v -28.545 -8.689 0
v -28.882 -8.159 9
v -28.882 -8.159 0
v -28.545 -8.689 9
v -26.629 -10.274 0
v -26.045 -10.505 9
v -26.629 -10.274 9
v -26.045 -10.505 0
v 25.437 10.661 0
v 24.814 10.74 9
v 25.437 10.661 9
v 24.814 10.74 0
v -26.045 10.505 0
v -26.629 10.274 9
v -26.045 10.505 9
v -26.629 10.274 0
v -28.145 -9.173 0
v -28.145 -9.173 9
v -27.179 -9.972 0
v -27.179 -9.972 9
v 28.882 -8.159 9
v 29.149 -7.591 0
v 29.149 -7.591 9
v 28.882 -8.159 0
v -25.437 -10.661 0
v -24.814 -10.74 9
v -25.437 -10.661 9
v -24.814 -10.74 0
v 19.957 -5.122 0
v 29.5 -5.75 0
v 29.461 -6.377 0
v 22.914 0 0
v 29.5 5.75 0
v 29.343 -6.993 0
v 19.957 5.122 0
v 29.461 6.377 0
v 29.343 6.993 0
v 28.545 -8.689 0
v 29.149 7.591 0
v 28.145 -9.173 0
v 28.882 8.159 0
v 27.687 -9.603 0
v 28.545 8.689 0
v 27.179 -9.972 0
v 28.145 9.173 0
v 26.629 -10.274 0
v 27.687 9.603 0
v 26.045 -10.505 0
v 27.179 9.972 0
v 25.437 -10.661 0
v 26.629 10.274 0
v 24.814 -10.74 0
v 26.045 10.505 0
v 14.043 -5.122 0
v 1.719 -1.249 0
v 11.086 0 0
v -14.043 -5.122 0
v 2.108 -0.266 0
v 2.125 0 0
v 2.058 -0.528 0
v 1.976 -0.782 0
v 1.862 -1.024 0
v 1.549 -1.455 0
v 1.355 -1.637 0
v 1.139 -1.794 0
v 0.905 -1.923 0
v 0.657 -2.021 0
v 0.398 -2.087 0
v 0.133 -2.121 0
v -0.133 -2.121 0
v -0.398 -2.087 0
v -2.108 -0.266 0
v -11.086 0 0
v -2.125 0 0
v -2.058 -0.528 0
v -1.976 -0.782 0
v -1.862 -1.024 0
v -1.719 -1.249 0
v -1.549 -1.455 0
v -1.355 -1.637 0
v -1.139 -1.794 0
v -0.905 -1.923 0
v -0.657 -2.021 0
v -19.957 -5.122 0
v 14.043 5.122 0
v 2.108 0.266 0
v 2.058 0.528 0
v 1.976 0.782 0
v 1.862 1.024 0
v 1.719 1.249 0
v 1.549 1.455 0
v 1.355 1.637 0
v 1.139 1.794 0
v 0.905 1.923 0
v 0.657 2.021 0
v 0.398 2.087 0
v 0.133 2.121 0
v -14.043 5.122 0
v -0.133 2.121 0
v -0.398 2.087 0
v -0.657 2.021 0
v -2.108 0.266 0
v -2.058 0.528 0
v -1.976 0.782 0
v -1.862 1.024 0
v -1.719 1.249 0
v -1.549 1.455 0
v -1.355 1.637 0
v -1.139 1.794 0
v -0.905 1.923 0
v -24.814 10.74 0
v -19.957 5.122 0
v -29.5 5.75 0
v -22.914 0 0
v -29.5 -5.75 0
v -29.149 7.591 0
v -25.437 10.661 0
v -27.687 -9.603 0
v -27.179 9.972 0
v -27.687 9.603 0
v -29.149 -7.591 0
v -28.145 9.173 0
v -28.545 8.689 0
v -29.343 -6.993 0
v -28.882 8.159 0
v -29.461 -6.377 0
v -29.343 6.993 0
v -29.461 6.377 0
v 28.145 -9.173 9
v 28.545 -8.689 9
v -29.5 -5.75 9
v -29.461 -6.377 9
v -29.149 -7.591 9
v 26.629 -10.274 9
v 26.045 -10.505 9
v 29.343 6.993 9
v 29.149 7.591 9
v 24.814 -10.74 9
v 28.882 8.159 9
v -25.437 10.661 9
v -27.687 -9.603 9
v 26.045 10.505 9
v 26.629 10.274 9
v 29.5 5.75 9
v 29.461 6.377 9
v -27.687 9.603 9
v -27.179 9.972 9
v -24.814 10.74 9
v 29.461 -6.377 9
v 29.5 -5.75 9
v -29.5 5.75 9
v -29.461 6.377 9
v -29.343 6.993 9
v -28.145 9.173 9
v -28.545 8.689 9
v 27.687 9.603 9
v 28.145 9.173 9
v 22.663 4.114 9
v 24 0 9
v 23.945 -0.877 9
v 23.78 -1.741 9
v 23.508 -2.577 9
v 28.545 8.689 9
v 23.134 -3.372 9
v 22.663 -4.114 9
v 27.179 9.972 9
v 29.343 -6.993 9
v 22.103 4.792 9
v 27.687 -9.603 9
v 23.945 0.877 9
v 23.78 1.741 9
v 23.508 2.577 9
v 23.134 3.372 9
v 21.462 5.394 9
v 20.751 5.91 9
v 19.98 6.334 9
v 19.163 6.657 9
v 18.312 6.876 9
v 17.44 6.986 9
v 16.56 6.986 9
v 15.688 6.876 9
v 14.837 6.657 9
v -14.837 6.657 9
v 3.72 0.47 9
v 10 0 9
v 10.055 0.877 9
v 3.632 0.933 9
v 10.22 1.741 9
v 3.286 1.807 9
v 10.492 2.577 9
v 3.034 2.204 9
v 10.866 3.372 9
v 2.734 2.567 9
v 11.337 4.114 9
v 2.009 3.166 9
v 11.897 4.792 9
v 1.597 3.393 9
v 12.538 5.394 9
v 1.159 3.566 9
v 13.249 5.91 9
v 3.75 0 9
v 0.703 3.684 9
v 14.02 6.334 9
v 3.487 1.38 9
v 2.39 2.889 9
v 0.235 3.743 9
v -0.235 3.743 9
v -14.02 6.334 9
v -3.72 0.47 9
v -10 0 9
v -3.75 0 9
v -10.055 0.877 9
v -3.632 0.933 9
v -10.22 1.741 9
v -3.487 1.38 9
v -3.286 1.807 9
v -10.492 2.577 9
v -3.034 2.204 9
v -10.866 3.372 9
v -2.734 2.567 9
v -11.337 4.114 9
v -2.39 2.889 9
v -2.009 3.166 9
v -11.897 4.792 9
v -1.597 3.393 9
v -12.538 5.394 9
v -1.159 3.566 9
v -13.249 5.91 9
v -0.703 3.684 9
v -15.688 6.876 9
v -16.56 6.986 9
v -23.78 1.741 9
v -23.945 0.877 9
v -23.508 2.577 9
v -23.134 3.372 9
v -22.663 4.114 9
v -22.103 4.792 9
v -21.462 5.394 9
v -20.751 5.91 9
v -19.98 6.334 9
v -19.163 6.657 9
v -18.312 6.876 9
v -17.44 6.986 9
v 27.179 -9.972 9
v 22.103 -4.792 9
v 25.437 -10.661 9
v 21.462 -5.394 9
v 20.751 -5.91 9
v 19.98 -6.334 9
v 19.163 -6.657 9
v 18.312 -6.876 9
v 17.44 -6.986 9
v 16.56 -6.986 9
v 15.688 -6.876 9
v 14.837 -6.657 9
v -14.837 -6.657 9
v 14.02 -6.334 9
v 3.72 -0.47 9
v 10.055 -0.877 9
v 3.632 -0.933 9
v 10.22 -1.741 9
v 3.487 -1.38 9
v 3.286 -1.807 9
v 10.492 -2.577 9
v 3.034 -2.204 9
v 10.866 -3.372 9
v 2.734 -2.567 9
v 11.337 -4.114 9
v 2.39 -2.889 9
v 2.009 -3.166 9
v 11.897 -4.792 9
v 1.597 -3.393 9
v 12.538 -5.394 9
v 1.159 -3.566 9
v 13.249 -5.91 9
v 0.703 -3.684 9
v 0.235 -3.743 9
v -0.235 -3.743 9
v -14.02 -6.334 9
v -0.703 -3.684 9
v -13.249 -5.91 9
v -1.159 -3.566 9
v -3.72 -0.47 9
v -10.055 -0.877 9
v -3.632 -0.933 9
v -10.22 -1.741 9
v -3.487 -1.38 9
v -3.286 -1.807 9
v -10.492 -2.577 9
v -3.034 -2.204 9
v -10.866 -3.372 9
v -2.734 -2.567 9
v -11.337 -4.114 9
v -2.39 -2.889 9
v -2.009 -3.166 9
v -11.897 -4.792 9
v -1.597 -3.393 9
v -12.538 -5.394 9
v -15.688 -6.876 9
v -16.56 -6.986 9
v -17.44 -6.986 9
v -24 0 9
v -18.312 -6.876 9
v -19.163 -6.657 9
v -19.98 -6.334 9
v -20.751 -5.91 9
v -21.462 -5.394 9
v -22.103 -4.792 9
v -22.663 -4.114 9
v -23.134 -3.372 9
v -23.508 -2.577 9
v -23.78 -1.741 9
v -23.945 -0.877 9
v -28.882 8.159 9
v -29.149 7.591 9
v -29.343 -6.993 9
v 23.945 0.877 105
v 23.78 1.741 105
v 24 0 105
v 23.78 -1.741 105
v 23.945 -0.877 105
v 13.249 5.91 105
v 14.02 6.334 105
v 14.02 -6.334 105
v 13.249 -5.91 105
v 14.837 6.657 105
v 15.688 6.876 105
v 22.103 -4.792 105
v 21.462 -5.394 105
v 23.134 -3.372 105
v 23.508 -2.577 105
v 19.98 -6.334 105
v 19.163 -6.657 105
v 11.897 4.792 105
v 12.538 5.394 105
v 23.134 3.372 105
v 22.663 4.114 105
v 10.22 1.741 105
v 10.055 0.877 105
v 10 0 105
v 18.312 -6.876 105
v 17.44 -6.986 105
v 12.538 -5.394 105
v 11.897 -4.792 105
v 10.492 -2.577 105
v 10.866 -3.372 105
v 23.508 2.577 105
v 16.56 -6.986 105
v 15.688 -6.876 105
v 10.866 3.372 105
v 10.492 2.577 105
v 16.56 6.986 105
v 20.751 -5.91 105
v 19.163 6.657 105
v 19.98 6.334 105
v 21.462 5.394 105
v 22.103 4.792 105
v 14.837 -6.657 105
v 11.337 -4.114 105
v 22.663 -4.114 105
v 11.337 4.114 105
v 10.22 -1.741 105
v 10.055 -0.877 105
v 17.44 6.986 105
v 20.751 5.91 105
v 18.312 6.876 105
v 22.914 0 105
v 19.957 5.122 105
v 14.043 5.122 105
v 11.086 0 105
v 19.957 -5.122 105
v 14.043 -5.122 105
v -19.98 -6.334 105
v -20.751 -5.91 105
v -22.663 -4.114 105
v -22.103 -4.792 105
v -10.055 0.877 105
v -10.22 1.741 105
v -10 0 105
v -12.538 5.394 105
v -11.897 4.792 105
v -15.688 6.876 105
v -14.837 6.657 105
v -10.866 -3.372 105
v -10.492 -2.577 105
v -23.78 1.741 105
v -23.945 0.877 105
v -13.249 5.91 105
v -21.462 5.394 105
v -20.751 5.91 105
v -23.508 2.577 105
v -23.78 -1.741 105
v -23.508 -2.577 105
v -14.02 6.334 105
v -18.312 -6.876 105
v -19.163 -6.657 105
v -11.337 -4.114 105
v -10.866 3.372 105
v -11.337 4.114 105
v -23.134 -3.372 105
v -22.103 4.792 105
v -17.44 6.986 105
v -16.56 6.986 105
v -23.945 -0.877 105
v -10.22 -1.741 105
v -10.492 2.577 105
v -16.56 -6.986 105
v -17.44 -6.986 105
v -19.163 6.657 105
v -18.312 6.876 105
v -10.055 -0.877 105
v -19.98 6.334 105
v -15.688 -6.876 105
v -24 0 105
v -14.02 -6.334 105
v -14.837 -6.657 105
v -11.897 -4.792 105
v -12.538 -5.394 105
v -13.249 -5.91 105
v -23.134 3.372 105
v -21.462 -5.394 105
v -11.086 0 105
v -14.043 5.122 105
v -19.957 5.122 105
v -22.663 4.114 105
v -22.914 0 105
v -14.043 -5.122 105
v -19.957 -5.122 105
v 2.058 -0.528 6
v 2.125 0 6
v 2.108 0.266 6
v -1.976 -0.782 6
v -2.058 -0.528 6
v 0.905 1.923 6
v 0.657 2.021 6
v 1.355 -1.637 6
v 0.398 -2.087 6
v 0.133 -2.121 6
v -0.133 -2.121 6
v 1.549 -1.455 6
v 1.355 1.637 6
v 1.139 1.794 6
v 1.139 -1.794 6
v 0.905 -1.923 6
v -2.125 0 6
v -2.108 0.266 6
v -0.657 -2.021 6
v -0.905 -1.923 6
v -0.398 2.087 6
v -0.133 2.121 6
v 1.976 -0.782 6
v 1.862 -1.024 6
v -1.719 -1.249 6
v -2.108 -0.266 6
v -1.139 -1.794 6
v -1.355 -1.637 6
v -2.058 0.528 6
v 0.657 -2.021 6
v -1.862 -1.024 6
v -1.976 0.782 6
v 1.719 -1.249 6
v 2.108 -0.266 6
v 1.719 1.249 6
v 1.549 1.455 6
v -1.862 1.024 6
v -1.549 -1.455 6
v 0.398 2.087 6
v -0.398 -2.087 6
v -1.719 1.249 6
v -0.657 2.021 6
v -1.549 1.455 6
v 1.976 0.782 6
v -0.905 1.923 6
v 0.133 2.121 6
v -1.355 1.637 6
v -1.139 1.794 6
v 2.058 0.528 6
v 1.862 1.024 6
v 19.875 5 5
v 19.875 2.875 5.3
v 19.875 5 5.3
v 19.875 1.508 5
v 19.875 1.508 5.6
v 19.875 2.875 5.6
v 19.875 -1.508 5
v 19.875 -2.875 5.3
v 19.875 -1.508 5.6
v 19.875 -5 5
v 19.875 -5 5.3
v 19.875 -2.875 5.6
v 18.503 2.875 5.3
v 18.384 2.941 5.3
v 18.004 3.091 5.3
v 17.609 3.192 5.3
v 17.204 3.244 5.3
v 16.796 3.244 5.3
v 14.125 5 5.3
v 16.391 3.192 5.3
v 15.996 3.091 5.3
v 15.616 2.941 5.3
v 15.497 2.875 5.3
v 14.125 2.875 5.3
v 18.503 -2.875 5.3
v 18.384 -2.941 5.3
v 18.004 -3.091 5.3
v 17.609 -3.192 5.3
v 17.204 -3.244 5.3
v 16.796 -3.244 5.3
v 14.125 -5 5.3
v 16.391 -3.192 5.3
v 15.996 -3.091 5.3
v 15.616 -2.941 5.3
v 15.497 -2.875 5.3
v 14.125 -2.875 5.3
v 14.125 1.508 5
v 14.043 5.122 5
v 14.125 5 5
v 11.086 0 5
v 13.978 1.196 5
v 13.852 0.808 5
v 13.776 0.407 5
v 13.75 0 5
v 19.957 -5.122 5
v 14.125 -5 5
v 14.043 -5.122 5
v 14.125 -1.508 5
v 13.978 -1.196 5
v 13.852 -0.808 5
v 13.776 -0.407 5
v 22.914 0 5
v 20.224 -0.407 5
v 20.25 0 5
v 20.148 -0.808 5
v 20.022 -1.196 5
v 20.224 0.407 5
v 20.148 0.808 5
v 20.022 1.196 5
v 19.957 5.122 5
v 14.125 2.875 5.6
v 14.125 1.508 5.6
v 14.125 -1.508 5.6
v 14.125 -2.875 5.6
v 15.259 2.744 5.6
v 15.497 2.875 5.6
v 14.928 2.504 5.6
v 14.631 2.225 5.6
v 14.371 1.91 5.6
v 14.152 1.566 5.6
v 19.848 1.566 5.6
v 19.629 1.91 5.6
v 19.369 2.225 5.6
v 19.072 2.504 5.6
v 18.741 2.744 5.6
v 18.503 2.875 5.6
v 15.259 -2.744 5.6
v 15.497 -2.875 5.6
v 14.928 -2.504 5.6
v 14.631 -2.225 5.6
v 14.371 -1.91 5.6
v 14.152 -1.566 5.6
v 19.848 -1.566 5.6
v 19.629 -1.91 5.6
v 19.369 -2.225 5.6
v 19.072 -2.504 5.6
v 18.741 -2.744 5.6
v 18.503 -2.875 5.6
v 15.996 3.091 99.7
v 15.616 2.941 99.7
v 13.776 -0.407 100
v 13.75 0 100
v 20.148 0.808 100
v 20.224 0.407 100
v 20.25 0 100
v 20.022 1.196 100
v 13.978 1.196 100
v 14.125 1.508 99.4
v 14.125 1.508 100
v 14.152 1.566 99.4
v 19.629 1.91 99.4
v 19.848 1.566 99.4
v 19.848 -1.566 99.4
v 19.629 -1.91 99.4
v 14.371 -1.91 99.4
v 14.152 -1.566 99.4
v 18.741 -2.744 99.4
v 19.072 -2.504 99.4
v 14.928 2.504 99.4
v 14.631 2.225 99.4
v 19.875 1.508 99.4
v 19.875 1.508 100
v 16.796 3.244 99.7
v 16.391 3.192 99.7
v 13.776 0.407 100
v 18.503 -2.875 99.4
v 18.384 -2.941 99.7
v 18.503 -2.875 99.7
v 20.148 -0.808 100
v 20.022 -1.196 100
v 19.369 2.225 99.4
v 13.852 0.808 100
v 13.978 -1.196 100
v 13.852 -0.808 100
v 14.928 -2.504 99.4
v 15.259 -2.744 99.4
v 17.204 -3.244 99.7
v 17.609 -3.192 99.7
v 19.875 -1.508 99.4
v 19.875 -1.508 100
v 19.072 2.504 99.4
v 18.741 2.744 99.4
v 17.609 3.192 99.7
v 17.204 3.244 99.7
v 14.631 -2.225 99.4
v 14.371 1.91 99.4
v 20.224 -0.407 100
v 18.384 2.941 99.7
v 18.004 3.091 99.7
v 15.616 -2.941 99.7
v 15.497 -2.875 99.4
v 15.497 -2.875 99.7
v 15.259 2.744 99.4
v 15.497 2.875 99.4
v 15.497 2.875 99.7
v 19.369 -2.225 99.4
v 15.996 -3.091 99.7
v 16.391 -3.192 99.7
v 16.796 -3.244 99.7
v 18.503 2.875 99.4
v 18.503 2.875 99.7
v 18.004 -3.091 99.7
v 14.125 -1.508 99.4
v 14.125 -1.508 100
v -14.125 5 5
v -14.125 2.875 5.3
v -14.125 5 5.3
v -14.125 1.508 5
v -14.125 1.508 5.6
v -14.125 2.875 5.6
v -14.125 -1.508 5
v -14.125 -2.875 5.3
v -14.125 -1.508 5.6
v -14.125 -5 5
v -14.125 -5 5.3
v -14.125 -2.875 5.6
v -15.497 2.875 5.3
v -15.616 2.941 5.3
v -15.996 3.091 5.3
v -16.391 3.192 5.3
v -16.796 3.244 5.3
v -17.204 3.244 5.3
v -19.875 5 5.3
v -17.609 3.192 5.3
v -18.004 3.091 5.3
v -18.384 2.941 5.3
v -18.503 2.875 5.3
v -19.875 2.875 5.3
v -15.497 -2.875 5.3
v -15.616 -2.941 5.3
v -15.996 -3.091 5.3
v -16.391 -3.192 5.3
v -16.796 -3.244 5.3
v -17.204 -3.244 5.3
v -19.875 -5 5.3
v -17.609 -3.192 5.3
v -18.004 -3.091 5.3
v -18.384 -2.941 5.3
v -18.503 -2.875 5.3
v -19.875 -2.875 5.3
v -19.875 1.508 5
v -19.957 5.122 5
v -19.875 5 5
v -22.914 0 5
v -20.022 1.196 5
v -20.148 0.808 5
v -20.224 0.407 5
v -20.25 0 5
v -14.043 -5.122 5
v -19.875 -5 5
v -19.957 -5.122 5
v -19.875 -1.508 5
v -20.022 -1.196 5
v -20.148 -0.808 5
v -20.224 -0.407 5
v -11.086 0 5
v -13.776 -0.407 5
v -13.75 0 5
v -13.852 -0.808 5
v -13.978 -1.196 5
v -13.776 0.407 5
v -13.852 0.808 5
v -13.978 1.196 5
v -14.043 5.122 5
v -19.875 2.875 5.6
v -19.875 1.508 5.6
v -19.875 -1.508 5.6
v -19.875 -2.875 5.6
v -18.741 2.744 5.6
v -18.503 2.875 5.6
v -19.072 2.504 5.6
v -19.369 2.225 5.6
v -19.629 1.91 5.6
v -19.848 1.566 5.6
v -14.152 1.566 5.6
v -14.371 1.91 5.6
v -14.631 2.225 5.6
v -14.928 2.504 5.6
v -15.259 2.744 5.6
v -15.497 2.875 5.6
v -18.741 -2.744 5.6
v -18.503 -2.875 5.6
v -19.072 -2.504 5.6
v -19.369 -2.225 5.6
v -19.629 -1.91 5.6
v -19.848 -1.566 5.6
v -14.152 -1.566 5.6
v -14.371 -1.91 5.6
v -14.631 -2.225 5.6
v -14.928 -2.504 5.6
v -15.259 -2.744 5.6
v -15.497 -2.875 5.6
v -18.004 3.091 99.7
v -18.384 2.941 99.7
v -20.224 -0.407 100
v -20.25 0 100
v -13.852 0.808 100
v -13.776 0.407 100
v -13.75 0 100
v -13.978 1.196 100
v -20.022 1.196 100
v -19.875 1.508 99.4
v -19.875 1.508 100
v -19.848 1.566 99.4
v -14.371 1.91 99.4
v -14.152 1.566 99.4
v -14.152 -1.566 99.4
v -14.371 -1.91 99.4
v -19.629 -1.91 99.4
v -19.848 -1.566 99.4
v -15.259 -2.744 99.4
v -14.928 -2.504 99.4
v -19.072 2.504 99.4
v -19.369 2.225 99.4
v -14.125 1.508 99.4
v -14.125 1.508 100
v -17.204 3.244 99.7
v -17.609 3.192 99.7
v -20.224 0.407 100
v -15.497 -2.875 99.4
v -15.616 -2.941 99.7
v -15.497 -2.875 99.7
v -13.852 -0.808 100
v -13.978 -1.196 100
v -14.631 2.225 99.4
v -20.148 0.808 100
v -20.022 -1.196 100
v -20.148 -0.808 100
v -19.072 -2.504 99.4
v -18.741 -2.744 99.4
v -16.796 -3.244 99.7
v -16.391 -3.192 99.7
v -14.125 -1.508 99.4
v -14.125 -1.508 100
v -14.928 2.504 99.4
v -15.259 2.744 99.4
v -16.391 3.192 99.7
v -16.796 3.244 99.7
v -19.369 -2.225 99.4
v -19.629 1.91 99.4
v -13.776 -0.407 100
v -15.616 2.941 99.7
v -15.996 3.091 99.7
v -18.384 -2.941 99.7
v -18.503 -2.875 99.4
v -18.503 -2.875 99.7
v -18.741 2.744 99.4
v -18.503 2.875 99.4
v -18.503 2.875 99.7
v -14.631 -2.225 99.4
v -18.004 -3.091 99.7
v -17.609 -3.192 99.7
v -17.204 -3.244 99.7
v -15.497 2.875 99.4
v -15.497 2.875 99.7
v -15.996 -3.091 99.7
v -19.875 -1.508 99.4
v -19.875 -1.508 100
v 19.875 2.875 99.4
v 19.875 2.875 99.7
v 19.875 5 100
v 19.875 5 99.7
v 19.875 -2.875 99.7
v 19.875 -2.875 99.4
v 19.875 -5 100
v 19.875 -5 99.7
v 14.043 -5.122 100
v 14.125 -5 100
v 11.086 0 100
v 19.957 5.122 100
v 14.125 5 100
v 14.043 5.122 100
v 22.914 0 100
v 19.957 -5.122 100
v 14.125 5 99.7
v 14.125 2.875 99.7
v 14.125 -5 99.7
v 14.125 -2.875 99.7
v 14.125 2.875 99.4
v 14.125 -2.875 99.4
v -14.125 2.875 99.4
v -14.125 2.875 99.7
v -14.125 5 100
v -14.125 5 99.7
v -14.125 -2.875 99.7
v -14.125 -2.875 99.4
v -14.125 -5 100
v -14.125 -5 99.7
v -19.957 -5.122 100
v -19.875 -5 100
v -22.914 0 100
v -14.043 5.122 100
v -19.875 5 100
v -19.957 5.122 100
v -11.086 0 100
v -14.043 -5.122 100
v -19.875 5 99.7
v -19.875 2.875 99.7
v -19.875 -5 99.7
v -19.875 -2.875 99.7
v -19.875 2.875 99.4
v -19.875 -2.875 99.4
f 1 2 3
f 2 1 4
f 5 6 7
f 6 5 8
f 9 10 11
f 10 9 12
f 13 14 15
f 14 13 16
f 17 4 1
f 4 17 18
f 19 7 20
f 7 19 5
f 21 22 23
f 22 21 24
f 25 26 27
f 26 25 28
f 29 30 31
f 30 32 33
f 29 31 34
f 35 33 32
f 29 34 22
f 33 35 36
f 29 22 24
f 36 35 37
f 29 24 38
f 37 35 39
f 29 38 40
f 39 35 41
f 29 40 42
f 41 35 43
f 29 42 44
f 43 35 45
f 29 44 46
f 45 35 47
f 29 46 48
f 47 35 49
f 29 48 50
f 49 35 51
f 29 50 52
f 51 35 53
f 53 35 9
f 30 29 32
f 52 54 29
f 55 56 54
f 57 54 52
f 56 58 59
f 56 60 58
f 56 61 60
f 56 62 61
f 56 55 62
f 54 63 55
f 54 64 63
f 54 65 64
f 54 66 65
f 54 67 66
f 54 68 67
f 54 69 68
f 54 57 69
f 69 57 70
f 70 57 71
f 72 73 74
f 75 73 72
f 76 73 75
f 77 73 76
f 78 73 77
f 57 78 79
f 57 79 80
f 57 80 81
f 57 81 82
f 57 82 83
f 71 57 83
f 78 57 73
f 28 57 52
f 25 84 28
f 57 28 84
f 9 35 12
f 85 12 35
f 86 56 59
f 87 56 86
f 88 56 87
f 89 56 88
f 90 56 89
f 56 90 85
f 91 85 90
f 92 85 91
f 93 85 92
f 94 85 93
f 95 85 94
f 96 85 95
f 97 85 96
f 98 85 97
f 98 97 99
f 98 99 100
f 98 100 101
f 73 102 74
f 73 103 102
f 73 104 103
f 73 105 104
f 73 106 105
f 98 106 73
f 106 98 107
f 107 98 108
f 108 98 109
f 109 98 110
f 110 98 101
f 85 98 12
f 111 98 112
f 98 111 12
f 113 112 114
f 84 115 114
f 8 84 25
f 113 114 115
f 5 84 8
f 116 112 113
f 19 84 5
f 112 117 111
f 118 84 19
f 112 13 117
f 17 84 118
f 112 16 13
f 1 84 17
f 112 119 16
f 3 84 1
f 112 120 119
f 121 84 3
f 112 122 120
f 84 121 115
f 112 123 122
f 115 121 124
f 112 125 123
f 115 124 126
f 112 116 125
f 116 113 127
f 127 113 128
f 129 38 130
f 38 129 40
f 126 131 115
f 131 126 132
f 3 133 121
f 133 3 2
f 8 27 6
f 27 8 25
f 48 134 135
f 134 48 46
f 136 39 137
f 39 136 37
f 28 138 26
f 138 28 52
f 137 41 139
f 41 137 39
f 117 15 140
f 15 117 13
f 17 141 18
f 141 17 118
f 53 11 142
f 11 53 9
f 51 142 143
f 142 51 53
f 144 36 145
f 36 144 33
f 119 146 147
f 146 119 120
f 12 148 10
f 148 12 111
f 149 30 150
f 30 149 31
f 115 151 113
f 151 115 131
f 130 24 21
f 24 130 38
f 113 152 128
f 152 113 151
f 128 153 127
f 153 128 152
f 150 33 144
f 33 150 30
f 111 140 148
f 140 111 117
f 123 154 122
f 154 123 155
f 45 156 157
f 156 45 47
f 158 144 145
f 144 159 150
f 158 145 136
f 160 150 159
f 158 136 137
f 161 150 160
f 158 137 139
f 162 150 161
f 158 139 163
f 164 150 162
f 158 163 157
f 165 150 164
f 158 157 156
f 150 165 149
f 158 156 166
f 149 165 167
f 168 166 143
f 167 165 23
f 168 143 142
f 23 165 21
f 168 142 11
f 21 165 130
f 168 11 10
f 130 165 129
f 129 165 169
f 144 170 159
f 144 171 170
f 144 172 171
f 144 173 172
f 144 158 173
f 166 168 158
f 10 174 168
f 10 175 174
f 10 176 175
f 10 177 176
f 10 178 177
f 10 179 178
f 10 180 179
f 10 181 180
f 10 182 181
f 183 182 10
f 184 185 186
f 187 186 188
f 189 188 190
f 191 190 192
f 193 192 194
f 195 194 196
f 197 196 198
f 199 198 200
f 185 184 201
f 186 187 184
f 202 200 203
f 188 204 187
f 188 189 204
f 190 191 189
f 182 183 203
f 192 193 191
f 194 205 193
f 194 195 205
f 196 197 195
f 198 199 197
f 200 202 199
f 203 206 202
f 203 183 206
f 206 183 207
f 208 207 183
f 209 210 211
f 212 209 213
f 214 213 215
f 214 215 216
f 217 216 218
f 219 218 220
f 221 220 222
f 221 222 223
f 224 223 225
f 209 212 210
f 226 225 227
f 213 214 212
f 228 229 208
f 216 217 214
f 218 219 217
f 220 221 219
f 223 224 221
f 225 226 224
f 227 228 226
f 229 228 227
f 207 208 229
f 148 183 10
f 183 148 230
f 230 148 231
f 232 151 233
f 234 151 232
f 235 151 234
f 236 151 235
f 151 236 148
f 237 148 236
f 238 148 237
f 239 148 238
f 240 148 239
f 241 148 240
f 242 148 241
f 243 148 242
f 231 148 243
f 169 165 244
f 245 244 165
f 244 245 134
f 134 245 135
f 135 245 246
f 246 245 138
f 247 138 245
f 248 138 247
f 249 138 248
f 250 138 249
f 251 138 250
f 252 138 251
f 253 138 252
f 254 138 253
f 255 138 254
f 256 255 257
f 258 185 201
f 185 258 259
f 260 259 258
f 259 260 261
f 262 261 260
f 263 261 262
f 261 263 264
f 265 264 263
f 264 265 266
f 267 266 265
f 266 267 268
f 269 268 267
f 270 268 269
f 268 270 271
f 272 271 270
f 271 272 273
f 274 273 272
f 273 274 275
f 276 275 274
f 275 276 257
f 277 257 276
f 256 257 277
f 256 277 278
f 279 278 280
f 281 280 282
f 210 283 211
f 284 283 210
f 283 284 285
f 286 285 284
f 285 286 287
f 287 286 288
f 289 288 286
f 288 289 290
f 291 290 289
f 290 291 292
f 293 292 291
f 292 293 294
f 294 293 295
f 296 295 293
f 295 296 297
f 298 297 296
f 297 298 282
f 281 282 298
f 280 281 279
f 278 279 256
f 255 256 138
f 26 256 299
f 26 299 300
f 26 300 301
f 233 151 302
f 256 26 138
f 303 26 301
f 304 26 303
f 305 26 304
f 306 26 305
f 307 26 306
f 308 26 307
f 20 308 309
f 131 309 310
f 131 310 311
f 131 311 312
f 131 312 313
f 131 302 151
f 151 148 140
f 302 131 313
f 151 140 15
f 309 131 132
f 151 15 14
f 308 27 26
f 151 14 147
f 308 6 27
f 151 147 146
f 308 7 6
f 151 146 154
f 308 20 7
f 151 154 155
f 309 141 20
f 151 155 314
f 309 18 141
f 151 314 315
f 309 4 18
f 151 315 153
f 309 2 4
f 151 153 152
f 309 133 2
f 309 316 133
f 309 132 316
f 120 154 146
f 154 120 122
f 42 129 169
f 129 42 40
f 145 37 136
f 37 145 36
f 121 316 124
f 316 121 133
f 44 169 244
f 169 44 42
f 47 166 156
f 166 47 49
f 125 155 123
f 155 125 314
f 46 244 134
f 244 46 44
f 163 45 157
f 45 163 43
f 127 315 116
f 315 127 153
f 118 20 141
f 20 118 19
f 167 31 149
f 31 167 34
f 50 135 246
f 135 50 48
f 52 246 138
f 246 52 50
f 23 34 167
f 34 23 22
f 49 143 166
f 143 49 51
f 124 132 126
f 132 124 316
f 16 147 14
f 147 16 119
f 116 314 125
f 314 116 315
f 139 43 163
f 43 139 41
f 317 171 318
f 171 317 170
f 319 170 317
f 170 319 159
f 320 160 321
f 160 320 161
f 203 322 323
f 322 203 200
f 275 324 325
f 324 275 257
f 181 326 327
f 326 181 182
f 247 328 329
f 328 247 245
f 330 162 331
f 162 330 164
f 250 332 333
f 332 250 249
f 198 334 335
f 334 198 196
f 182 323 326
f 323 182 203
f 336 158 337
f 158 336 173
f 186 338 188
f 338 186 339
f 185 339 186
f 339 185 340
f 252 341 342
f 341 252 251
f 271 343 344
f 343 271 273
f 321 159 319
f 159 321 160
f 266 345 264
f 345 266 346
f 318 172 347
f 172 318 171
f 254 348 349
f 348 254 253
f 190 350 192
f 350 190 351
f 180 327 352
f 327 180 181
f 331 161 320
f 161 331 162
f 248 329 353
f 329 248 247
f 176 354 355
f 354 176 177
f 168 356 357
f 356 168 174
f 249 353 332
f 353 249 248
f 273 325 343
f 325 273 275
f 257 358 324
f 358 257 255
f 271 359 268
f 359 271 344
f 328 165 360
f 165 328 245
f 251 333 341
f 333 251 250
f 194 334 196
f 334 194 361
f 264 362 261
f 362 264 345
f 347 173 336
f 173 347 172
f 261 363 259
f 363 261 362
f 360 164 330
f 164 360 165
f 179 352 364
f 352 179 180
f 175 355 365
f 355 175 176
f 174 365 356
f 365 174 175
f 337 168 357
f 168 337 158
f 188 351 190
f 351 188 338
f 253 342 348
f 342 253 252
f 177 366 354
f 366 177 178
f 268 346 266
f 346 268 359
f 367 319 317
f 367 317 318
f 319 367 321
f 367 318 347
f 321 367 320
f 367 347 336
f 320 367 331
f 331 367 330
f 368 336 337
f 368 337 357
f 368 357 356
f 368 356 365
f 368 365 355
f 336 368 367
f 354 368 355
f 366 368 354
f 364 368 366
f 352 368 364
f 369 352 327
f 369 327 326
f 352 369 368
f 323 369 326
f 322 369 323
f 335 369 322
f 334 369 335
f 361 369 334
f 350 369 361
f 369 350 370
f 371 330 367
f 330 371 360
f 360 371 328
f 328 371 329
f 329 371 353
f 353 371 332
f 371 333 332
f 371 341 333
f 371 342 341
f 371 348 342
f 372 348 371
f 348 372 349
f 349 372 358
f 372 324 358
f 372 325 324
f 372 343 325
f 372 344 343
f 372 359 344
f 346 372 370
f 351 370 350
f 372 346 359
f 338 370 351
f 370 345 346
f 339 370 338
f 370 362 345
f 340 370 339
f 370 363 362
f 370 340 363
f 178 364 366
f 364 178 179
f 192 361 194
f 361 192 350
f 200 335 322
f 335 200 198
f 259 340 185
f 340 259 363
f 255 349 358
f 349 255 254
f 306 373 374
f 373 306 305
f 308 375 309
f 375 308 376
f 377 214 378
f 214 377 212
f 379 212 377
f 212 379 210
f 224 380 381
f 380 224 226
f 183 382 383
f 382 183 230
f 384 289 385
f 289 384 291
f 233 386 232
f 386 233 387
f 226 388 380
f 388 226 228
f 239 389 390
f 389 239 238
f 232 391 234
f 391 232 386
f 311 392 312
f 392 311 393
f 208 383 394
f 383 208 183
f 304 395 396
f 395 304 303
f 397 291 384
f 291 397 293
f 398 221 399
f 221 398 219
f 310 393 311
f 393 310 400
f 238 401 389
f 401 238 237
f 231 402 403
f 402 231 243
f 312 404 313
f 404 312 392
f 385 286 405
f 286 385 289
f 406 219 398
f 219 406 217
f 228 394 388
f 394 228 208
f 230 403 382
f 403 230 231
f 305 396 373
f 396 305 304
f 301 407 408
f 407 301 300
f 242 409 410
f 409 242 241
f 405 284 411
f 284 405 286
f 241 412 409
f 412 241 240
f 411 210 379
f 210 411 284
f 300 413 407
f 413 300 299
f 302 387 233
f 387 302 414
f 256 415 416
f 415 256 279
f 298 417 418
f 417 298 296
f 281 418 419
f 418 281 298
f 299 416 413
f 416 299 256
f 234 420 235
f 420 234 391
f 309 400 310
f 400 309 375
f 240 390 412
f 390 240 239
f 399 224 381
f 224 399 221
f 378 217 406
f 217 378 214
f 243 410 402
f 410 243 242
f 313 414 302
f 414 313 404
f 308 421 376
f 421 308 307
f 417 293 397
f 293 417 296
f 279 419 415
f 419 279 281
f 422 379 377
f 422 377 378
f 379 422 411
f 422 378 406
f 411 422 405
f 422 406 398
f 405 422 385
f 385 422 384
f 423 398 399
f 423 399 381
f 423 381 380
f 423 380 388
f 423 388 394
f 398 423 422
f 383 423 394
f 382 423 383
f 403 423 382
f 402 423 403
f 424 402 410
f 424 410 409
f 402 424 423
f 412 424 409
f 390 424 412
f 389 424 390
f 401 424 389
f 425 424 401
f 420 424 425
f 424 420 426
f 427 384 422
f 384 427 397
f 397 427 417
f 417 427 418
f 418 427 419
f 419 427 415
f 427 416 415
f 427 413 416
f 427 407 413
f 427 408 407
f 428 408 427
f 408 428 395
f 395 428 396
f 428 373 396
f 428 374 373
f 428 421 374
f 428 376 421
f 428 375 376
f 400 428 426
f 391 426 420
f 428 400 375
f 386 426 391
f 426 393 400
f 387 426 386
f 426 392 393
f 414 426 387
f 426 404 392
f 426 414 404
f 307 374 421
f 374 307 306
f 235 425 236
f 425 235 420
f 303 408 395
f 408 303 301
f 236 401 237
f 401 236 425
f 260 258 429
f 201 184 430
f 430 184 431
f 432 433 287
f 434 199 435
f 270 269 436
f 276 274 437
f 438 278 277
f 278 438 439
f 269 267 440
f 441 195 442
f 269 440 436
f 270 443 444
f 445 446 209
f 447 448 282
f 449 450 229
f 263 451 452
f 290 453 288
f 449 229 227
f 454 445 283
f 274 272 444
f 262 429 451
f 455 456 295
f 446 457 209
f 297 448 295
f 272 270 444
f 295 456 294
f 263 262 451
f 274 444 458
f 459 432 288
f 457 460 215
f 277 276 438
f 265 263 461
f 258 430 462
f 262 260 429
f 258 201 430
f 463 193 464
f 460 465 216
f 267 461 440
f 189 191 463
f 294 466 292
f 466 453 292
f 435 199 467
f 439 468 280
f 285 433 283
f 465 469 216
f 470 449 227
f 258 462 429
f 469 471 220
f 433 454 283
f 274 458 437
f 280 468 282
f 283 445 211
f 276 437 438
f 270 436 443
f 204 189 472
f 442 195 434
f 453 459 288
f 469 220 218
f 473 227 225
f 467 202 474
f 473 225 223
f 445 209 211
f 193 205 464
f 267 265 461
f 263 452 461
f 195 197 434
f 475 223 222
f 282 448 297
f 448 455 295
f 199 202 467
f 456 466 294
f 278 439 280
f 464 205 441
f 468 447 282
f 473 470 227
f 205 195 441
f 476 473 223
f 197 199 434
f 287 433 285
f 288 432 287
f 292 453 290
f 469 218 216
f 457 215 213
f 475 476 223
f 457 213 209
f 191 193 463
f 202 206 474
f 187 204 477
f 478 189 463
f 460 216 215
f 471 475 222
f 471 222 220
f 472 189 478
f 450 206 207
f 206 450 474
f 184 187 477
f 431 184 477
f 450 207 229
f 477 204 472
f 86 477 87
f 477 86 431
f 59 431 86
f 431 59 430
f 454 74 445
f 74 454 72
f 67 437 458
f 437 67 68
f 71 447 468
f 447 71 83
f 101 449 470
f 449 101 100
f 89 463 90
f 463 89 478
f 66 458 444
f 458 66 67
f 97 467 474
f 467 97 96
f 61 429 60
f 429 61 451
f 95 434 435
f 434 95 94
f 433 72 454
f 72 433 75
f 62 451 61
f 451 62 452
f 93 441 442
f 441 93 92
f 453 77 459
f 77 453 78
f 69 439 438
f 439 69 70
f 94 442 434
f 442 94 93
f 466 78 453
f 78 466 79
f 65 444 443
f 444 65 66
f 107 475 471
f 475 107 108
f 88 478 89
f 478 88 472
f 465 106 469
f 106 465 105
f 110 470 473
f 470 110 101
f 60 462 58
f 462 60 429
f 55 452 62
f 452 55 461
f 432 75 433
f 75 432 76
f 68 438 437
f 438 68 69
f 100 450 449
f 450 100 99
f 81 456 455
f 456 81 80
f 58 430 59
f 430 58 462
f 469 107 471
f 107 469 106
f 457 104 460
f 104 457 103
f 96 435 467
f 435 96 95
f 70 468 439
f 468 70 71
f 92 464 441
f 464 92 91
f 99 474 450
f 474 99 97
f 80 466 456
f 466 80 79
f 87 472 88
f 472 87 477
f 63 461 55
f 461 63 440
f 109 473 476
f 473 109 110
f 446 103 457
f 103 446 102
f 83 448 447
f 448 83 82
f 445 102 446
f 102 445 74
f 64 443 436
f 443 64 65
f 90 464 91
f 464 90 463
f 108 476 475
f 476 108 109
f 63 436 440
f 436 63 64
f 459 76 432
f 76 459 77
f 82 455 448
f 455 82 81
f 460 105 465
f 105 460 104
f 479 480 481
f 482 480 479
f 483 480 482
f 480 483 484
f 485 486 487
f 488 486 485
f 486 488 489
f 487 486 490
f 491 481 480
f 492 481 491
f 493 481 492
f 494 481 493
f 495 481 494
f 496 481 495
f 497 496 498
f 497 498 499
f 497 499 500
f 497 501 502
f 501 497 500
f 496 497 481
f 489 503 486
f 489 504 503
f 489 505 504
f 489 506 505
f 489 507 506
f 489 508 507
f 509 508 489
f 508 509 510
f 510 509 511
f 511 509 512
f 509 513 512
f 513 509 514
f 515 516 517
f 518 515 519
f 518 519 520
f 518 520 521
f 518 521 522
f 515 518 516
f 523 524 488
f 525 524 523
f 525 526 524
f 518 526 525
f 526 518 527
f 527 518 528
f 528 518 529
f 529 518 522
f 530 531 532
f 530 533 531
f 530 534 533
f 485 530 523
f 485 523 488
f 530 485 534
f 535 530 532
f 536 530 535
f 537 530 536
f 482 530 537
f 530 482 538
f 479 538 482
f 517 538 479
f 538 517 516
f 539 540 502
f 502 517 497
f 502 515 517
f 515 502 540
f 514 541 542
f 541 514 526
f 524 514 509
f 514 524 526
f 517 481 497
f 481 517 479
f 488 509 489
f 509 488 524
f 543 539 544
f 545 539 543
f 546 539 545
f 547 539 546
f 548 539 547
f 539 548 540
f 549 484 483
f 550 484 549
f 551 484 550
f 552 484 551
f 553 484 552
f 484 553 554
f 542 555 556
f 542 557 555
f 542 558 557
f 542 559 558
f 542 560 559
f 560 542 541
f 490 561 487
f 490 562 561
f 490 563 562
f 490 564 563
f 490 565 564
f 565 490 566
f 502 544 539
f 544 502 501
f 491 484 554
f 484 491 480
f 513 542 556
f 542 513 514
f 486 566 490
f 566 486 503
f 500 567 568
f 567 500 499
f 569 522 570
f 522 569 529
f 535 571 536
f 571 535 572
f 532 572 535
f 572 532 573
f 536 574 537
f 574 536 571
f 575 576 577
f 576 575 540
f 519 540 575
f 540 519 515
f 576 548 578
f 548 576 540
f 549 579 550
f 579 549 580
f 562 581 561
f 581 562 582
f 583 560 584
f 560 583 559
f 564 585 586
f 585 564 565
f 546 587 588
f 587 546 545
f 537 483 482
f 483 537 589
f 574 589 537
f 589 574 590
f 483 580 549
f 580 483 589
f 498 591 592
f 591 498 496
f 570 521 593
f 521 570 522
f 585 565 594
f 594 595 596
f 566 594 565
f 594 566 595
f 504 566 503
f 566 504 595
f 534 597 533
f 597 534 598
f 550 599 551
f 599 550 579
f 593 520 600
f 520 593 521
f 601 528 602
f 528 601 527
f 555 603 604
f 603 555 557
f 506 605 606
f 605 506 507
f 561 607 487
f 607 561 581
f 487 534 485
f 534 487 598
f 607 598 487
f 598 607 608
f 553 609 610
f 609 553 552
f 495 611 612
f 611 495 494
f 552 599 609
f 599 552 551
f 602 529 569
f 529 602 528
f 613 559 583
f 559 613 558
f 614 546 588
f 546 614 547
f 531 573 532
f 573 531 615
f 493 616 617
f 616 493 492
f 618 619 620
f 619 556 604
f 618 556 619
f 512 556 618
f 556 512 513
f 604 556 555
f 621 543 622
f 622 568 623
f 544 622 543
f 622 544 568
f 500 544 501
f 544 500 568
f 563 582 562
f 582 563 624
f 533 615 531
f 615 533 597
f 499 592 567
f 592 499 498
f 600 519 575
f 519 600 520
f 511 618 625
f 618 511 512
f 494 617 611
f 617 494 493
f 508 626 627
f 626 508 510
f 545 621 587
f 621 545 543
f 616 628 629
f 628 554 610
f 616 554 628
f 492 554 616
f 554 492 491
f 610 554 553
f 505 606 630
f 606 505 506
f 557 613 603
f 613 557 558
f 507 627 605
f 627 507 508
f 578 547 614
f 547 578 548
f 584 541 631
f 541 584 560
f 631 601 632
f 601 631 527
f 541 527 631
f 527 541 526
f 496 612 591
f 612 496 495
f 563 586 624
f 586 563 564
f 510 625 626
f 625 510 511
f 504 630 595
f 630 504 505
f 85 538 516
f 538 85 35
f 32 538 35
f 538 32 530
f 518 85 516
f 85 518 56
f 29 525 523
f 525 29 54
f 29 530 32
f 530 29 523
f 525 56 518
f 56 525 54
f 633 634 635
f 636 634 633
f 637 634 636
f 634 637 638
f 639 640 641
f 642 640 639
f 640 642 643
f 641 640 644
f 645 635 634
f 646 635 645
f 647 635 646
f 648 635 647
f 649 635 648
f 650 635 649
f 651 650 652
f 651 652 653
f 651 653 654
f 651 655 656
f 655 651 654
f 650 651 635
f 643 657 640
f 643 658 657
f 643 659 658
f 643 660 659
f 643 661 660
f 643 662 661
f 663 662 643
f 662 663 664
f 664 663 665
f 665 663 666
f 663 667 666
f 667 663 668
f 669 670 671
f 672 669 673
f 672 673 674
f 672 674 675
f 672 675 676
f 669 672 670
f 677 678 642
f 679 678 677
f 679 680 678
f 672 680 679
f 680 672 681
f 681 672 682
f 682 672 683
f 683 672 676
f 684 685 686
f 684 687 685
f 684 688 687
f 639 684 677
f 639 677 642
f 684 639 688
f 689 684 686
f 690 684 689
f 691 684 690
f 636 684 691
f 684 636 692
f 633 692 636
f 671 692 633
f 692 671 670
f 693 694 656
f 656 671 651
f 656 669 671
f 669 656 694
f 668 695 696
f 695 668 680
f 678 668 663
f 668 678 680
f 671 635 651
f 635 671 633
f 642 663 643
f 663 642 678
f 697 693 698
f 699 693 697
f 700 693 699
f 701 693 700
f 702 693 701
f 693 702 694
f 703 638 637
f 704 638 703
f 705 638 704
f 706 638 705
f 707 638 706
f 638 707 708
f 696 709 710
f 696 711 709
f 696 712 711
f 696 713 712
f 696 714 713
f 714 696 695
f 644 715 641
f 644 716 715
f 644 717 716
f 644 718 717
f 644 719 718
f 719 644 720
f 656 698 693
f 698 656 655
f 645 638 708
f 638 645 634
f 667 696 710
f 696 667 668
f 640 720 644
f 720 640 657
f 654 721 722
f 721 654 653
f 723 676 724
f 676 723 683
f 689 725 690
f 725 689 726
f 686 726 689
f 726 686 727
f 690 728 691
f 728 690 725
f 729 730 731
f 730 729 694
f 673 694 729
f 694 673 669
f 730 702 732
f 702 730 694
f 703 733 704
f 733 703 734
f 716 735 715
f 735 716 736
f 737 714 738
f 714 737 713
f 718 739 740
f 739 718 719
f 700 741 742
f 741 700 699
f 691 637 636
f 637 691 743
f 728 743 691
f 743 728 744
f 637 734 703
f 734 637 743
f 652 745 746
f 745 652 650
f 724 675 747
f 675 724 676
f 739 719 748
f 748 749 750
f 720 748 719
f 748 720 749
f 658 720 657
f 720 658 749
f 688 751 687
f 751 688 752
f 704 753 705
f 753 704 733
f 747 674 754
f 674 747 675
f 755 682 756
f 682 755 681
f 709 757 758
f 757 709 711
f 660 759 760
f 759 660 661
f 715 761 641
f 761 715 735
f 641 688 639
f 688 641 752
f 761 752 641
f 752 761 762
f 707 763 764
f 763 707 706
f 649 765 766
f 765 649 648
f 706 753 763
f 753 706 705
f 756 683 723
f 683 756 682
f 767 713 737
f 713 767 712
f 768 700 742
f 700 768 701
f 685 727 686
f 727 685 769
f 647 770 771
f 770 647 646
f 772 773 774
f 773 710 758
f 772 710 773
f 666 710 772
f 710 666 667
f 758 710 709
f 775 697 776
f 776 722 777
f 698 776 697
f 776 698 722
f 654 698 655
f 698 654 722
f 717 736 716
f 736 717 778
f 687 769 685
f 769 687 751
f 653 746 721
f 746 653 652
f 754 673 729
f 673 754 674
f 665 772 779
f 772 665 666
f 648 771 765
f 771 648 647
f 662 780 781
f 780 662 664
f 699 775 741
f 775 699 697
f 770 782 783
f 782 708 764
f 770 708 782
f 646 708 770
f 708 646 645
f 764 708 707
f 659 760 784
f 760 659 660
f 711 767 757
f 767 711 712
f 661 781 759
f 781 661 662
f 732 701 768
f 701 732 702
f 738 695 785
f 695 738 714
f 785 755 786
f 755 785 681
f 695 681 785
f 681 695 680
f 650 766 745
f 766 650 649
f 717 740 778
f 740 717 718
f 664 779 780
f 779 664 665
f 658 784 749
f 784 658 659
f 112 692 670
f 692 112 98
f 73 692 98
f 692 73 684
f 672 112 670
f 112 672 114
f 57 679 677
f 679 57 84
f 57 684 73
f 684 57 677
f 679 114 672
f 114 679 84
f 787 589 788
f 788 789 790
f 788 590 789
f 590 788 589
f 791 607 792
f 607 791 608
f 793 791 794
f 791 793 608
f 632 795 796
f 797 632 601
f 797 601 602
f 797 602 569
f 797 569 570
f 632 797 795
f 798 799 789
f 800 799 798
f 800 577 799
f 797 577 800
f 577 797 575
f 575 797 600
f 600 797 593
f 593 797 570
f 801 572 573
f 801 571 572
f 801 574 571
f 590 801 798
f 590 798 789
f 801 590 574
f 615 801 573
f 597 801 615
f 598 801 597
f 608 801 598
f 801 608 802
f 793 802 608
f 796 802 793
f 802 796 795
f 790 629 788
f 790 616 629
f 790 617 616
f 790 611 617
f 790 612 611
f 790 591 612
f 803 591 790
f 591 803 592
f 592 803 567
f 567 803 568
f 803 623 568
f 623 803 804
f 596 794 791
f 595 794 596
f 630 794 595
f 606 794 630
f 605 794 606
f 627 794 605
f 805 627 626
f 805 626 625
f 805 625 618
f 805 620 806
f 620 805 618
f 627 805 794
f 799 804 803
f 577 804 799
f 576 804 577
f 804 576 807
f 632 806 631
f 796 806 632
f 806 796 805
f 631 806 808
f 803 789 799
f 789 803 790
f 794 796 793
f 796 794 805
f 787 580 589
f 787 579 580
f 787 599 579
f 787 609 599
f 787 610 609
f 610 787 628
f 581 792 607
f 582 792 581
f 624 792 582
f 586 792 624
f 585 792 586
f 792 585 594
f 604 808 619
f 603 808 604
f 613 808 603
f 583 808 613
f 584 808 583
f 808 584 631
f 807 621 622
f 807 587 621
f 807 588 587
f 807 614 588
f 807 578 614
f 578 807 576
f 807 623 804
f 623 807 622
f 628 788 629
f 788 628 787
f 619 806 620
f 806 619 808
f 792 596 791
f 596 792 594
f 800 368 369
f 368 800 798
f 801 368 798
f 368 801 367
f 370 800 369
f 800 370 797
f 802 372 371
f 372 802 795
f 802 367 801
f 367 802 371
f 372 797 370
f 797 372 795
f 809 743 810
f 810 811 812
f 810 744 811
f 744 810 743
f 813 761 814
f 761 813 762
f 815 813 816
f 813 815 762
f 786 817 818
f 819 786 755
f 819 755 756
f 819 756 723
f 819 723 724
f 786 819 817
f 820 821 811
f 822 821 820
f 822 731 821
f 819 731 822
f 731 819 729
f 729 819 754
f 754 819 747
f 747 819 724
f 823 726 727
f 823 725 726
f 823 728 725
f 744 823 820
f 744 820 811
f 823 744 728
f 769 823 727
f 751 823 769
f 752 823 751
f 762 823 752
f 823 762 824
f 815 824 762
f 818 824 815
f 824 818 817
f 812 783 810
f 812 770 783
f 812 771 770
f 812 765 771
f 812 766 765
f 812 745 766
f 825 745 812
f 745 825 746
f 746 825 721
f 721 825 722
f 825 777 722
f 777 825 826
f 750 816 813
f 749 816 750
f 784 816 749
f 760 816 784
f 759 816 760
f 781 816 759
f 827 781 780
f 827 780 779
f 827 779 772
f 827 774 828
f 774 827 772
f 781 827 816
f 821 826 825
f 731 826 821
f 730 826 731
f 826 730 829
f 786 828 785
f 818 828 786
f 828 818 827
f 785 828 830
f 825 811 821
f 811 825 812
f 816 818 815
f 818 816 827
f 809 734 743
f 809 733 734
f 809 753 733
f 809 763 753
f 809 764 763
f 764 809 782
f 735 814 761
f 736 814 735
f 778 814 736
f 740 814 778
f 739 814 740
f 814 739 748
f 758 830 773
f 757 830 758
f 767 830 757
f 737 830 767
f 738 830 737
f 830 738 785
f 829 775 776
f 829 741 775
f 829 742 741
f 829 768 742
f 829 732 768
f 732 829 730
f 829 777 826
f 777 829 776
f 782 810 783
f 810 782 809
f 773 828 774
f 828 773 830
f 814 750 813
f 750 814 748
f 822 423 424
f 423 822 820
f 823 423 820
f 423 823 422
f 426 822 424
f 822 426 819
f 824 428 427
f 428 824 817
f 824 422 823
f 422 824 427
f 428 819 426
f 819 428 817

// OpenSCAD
$fn = 50;


difference() {
	union() {
		hull() {
			translate(v = [-24.5000000000, 5.7500000000, 0]) {
				cylinder(h = 9, r = 5);
			}
			translate(v = [24.5000000000, 5.7500000000, 0]) {
				cylinder(h = 9, r = 5);
			}
			translate(v = [-24.5000000000, -5.7500000000, 0]) {
				cylinder(h = 9, r = 5);
			}
			translate(v = [24.5000000000, -5.7500000000, 0]) {
				cylinder(h = 9, r = 5);
			}
		}
		translate(v = [17.0000000000, 0, 0.0000000000]) {
			cylinder(h = 105, r = 7.0000000000);
		}
		translate(v = [-17.0000000000, 0, 0.0000000000]) {
			cylinder(h = 105, r = 7.0000000000);
		}
		translate(v = [17.0000000000, 0, 99.0000000000]) {
			cylinder(h = 6, r = 7.0000000000);
		}
		translate(v = [-17.0000000000, 0, 99.0000000000]) {
			cylinder(h = 6, r = 7.0000000000);
		}
	}
	union() {
		translate(v = [0, 0, 9]) {
			rotate(a = [0, 0, 0]) {
				difference() {
					union() {
						#translate(v = [0, 0, -100.0000000000]) {
							cylinder(h = 100, r = 2.0000000000);
						}
						#translate(v = [0, 0, -3]) {
							cylinder(h = 3, r1 = 2.1250000000, r2 = 3.7500000000);
						}
						#translate(v = [0, 0, -100.0000000000]) {
							cylinder(h = 100, r = 2.1250000000);
						}
						#translate(v = [0, 0, -100.0000000000]) {
							cylinder(h = 100, r = 2.0000000000);
						}
					}
					union();
				}
			}
		}
		translate(v = [17.0000000000, 0, 0]) {
			rotate(a = [0, 0, 0]) {
				difference() {
					union() {
						#translate(v = [-2.8750000000, -5.0000000000, -0.3000000000]) {
							cube(size = [5.7500000000, 10, 0.3000000000]);
						}
						#translate(v = [-2.8750000000, -2.8750000000, -0.6000000000]) {
							cube(size = [5.7500000000, 5.7500000000, 0.3000000000]);
						}
						#translate(v = [-2.8750000000, -5.0000000000, 5]) {
							cube(size = [5.7500000000, 10, 0.3000000000]);
						}
						#translate(v = [-2.8750000000, -2.8750000000, 5.3000000000]) {
							cube(size = [5.7500000000, 5.7500000000, 0.3000000000]);
						}
						#translate(v = [0, 0, -100.0000000000]) {
							cylinder(h = 200, r = 3.2500000000);
						}
						#linear_extrude(height = 5) {
							polygon(points = [[5.9142500000, 0.0000000000], [2.9571250000, 5.1218907443], [-2.9571250000, 5.1218907443], [-5.9142500000, 0.0000000000], [-2.9571250000, -5.1218907443], [2.9571250000, -5.1218907443]]);
						}
						#translate(v = [-2.8750000000, -5.0000000000, -0.3000000000]) {
							cube(size = [5.7500000000, 10, 0.3000000000]);
						}
						#translate(v = [-2.8750000000, -2.8750000000, -0.6000000000]) {
							cube(size = [5.7500000000, 5.7500000000, 0.3000000000]);
						}
						#translate(v = [-2.8750000000, -5.0000000000, 5]) {
							cube(size = [5.7500000000, 10, 0.3000000000]);
						}
						#translate(v = [-2.8750000000, -2.8750000000, 5.3000000000]) {
							cube(size = [5.7500000000, 5.7500000000, 0.3000000000]);
						}
						#translate(v = [0, 0, -100.0000000000]) {
							cylinder(h = 200, r = 3.2500000000);
						}
						#translate(v = [-2.8750000000, -5.0000000000, -0.3000000000]) {
							cube(size = [5.7500000000, 10, 0.3000000000]);
						}
						#translate(v = [-2.8750000000, -2.8750000000, -0.6000000000]) {
							cube(size = [5.7500000000, 5.7500000000, 0.3000000000]);
						}
						#translate(v = [-2.8750000000, -5.0000000000, 5]) {
							cube(size = [5.7500000000, 10, 0.3000000000]);
						}
						#translate(v = [-2.8750000000, -2.8750000000, 5.3000000000]) {
							cube(size = [5.7500000000, 5.7500000000, 0.3000000000]);
						}
						#translate(v = [0, 0, -100.0000000000]) {
							cylinder(h = 200, r = 3.2500000000);
						}
					}
					union();
				}
			}
		}
		translate(v = [-17.0000000000, 0, 0]) {
			rotate(a = [0, 0, 0]) {
				difference() {
					union() {
						#translate(v = [-2.8750000000, -5.0000000000, -0.3000000000]) {
							cube(size = [5.7500000000, 10, 0.3000000000]);
						}
						#translate(v = [-2.8750000000, -2.8750000000, -0.6000000000]) {
							cube(size = [5.7500000000, 5.7500000000, 0.3000000000]);
						}
						#translate(v = [-2.8750000000, -5.0000000000, 5]) {
							cube(size = [5.7500000000, 10, 0.3000000000]);
						}
						#translate(v = [-2.8750000000, -2.8750000000, 5.3000000000]) {
							cube(size = [5.7500000000, 5.7500000000, 0.3000000000]);
						}
						#translate(v = [0, 0, -100.0000000000]) {
							cylinder(h = 200, r = 3.2500000000);
						}
						#linear_extrude(height = 5) {
							polygon(points = [[5.9142500000, 0.0000000000], [2.9571250000, 5.1218907443], [-2.9571250000, 5.1218907443], [-5.9142500000, 0.0000000000], [-2.9571250000, -5.1218907443], [2.9571250000, -5.1218907443]]);
						}
						#translate(v = [-2.8750000000, -5.0000000000, -0.3000000000]) {
							cube(size = [5.7500000000, 10, 0.3000000000]);
						}
						#translate(v = [-2.8750000000, -2.8750000000, -0.6000000000]) {
							cube(size = [5.7500000000, 5.7500000000, 0.3000000000]);
						}
						#translate(v = [-2.8750000000, -5.0000000000, 5]) {
							cube(size = [5.7500000000, 10, 0.3000000000]);
						}
						#translate(v = [-2.8750000000, -2.8750000000, 5.3000000000]) {
							cube(size = [5.7500000000, 5.7500000000, 0.3000000000]);
						}
						#translate(v = [0, 0, -100.0000000000]) {
							cylinder(h = 200, r = 3.2500000000);
						}
						#translate(v = [-2.8750000000, -5.0000000000, -0.3000000000]) {
							cube(size = [5.7500000000, 10, 0.3000000000]);
						}
						#translate(v = [-2.8750000000, -2.8750000000, -0.6000000000]) {
							cube(size = [5.7500000000, 5.7500000000, 0.3000000000]);
						}
						#translate(v = [-2.8750000000, -5.0000000000, 5]) {
							cube(size = [5.7500000000, 10, 0.3000000000]);
						}
						#translate(v = [-2.8750000000, -2.8750000000, 5.3000000000]) {
							cube(size = [5.7500000000, 5.7500000000, 0.3000000000]);
						}
						#translate(v = [0, 0, -100.0000000000]) {
							cylinder(h = 200, r = 3.2500000000);
						}
					}
					union();
				}
			}
		}
		translate(v = [17.0000000000, 0, 105]) {
			rotate(a = [0, 0, 0]) {
				difference() {
					union() {
						#translate(v = [-2.8750000000, -5.0000000000, -5.3000000000]) {
							cube(size = [5.7500000000, 10, 0.3000000000]);
						}
						#translate(v = [-2.8750000000, -2.8750000000, -5.6000000000]) {
							cube(size = [5.7500000000, 5.7500000000, 0.3000000000]);
						}
						#translate(v = [-2.8750000000, -5.0000000000, 0]) {
							cube(size = [5.7500000000, 10, 0.3000000000]);
						}
						#translate(v = [-2.8750000000, -2.8750000000, 0.3000000000]) {
							cube(size = [5.7500000000, 5.7500000000, 0.3000000000]);
						}
						#translate(v = [0, 0, -100.0000000000]) {
							cylinder(h = 200, r = 3.2500000000);
						}
						translate(v = [0, 0, -5]) {
							#linear_extrude(height = 5) {
								polygon(points = [[5.9142500000, 0.0000000000], [2.9571250000, 5.1218907443], [-2.9571250000, 5.1218907443], [-5.9142500000, 0.0000000000], [-2.9571250000, -5.1218907443], [2.9571250000, -5.1218907443]]);
							}
						}
						#translate(v = [-2.8750000000, -5.0000000000, -5.3000000000]) {
							cube(size = [5.7500000000, 10, 0.3000000000]);
						}
						#translate(v = [-2.8750000000, -2.8750000000, -5.6000000000]) {
							cube(size = [5.7500000000, 5.7500000000, 0.3000000000]);
						}
						#translate(v = [-2.8750000000, -5.0000000000, 0]) {
							cube(size = [5.7500000000, 10, 0.3000000000]);
						}
						#translate(v = [-2.8750000000, -2.8750000000, 0.3000000000]) {
							cube(size = [5.7500000000, 5.7500000000, 0.3000000000]);
						}
						#translate(v = [0, 0, -100.0000000000]) {
							cylinder(h = 200, r = 3.2500000000);
						}
						#translate(v = [-2.8750000000, -5.0000000000, -5.3000000000]) {
							cube(size = [5.7500000000, 10, 0.3000000000]);
						}
						#translate(v = [-2.8750000000, -2.8750000000, -5.6000000000]) {
							cube(size = [5.7500000000, 5.7500000000, 0.3000000000]);
						}
						#translate(v = [-2.8750000000, -5.0000000000, 0]) {
							cube(size = [5.7500000000, 10, 0.3000000000]);
						}
						#translate(v = [-2.8750000000, -2.8750000000, 0.3000000000]) {
							cube(size = [5.7500000000, 5.7500000000, 0.3000000000]);
						}
						#translate(v = [0, 0, -100.0000000000]) {
							cylinder(h = 200, r = 3.2500000000);
						}
					}
					union();
				}
			}
		}
		translate(v = [-17.0000000000, 0, 105]) {
			rotate(a = [0, 0, 0]) {
				difference() {
					union() {
						#translate(v = [-2.8750000000, -5.0000000000, -5.3000000000]) {
							cube(size = [5.7500000000, 10, 0.3000000000]);
						}
						#translate(v = [-2.8750000000, -2.8750000000, -5.6000000000]) {
							cube(size = [5.7500000000, 5.7500000000, 0.3000000000]);
						}
						#translate(v = [-2.8750000000, -5.0000000000, 0]) {
							cube(size = [5.7500000000, 10, 0.3000000000]);
						}
						#translate(v = [-2.8750000000, -2.8750000000, 0.3000000000]) {
							cube(size = [5.7500000000, 5.7500000000, 0.3000000000]);
						}
						#translate(v = [0, 0, -100.0000000000]) {
							cylinder(h = 200, r = 3.2500000000);
						}
						translate(v = [0, 0, -5]) {
							#linear_extrude(height = 5) {
								polygon(points = [[5.9142500000, 0.0000000000], [2.9571250000, 5.1218907443], [-2.9571250000, 5.1218907443], [-5.9142500000, 0.0000000000], [-2.9571250000, -5.1218907443], [2.9571250000, -5.1218907443]]);
							}
						}
						#translate(v = [-2.8750000000, -5.0000000000, -5.3000000000]) {
							cube(size = [5.7500000000, 10, 0.3000000000]);
						}
						#translate(v = [-2.8750000000, -2.8750000000, -5.6000000000]) {
							cube(size = [5.7500000000, 5.7500000000, 0.3000000000]);
						}
						#translate(v = [-2.8750000000, -5.0000000000, 0]) {
							cube(size = [5.7500000000, 10, 0.3000000000]);
						}
						#translate(v = [-2.8750000000, -2.8750000000, 0.3000000000]) {
							cube(size = [5.7500000000, 5.7500000000, 0.3000000000]);
						}
						#translate(v = [0, 0, -100.0000000000]) {
							cylinder(h = 200, r = 3.2500000000);
						}
						#translate(v = [-2.8750000000, -5.0000000000, -5.3000000000]) {
							cube(size = [5.7500000000, 10, 0.3000000000]);
						}
						#translate(v = [-2.8750000000, -2.8750000000, -5.6000000000]) {
							cube(size = [5.7500000000, 5.7500000000, 0.3000000000]);
						}
						#translate(v = [-2.8750000000, -5.0000000000, 0]) {
							cube(size = [5.7500000000, 10, 0.3000000000]);
						}
						#translate(v = [-2.8750000000, -2.8750000000, 0.3000000000]) {
							cube(size = [5.7500000000, 5.7500000000, 0.3000000000]);
						}
						#translate(v = [0, 0, -100.0000000000]) {
							cylinder(h = 200, r = 3.2500000000);
						}
					}
					union();
				}
			}
		}
	}
}
